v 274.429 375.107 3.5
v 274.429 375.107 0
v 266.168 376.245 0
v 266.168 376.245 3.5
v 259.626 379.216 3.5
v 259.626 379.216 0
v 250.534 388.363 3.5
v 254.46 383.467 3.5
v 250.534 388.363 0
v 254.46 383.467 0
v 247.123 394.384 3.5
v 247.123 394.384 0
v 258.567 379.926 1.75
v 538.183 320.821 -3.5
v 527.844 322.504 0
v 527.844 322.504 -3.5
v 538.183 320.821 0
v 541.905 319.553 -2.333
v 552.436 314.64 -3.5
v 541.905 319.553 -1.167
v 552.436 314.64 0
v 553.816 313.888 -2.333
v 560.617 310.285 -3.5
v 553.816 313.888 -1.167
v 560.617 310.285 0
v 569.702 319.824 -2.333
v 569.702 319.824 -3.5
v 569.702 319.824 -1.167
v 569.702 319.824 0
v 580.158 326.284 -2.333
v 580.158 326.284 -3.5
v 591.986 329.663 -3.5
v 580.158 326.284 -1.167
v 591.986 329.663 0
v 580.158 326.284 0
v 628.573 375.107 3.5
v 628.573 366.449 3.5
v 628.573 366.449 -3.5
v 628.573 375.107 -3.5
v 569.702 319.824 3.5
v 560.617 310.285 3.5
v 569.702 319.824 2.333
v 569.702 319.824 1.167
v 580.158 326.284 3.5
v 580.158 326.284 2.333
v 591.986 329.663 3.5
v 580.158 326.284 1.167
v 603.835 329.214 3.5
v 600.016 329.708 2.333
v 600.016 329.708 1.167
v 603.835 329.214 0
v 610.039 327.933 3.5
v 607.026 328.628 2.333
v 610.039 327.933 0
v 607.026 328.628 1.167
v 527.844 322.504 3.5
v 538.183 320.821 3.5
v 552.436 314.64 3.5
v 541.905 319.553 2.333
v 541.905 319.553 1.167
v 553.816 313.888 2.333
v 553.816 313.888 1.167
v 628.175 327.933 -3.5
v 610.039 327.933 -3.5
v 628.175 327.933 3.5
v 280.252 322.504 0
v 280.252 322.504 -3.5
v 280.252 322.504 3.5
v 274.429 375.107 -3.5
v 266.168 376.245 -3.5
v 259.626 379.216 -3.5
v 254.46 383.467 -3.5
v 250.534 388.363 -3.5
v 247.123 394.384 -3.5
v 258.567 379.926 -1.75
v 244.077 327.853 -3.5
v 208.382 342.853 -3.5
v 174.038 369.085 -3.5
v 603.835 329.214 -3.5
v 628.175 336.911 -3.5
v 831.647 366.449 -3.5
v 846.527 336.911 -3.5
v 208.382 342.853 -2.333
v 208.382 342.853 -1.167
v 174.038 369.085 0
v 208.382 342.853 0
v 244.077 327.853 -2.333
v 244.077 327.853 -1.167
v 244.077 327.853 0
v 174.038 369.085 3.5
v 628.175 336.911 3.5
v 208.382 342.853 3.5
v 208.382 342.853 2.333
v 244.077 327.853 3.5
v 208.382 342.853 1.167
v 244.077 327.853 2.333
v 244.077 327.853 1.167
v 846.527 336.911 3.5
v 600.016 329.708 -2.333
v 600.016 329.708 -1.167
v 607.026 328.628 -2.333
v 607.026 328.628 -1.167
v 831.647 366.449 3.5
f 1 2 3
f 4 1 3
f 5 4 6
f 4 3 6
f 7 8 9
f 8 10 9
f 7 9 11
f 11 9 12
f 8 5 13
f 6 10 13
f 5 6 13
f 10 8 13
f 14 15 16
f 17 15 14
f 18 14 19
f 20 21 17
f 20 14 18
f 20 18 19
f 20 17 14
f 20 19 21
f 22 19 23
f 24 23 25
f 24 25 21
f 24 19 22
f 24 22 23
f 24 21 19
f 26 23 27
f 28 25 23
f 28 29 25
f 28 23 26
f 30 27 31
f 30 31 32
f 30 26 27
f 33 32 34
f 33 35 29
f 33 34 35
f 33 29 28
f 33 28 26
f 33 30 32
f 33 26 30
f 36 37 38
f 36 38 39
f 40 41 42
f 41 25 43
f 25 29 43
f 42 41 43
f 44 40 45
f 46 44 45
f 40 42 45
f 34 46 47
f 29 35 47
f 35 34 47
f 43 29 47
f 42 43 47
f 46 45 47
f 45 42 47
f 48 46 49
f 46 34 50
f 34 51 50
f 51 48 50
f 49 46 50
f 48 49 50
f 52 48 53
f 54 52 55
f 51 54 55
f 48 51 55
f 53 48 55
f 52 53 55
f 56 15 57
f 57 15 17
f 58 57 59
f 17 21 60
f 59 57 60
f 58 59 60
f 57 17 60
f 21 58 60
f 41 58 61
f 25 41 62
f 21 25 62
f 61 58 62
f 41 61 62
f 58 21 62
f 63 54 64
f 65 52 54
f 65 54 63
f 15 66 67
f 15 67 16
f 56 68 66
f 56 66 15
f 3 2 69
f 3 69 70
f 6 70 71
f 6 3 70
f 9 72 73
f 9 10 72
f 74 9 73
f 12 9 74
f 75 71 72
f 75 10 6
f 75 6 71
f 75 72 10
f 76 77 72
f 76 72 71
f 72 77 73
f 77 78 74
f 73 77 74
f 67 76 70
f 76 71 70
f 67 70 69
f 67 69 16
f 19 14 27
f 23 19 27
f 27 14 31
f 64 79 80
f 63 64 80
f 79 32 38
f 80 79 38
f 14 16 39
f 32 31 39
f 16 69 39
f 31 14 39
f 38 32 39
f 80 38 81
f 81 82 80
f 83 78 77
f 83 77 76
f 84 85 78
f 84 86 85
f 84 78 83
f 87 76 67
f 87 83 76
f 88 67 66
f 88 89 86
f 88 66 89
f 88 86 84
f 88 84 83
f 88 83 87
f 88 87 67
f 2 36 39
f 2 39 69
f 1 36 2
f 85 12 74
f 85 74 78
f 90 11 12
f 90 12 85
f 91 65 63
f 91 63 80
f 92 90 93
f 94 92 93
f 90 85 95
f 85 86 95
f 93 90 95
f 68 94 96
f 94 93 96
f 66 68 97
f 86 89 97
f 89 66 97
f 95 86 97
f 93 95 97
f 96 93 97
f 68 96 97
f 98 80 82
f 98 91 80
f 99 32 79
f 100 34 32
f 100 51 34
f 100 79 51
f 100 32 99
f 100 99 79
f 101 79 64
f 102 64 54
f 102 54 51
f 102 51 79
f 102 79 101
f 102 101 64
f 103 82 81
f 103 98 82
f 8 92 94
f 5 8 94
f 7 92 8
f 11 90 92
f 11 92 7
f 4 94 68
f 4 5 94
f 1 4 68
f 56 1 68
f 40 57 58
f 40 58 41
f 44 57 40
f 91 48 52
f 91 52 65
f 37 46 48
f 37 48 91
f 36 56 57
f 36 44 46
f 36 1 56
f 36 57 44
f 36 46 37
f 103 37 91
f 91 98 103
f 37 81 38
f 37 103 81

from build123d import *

# Parameters (mm, degrees)
AUFSATZ_LINEAR_AUSTRAGEN1_DEPTH = 3.5


with BuildPart() as part:
    # Skizze1 → Aufsatz-Linear austragen1 (new body, symmetric)
    with BuildSketch(Plane.XY):
        with BuildLine():
            Line((831.647452371, 366.448530177), (628.572821229, 366.448530177))
            Line((628.572821229, 366.448530177), (628.572821229, 375.106989994))
            Line((628.572821229, 375.106989994), (274.428895499, 375.106989994))
            add(Edge.make_bspline(
                [(274.428895499, 375.106989994), (256.358547924, 375.106989994), (247.122592497, 394.383569374)],
                knots=[0, 0, 0, 1, 1, 1], degree=2))
            Line((247.122592497, 394.383569374), (174.038075638, 369.085082769))
            add(Edge.make_bspline(
                [(174.038075638, 369.085082769), (207.417770849, 336.709288166), (244.126187853, 323.555937748), (280.251563051, 322.503742353)],
                knots=[0, 0, 0, 0, 1, 1, 1, 1], degree=3))
            Line((280.251563051, 322.503742353), (527.843524378, 322.503742353))
            add(Edge.make_bspline(
                [(527.843524378, 322.503742353), (541.993033664, 322.503742353), (557.358077917, 311.262922103), (560.616559045, 310.285377764)],
                knots=[0, 0, 0, 0, 1, 1, 1, 1], degree=3))
            add(Edge.make_bspline(
                [(560.616559045, 310.285377764), (569.016239065, 321.364266067), (579.47275725, 327.823555694), (591.986113601, 329.663246645)],
                knots=[0, 0, 0, 0, 1, 1, 1, 1], degree=3))
            add(Edge.make_bspline(
                [(591.986113601, 329.663246645), (599.533888677, 330.772906845), (610.017065826, 327.93253872), (610.038691557, 327.93253872)],
                knots=[0, 0, 0, 0, 1, 1, 1, 1], degree=3))
            Line((610.038691557, 327.93253872), (628.174793789, 327.93253872))
            Line((628.174793789, 327.93253872), (628.174793789, 336.911119919))
            Line((628.174793789, 336.911119919), (846.52672127, 336.911119919))
            Line((846.52672127, 336.911119919), (831.647452371, 366.448530177))
        make_face()
    extrude(amount=AUFSATZ_LINEAR_AUSTRAGEN1_DEPTH, both=True)


solid = part.part
